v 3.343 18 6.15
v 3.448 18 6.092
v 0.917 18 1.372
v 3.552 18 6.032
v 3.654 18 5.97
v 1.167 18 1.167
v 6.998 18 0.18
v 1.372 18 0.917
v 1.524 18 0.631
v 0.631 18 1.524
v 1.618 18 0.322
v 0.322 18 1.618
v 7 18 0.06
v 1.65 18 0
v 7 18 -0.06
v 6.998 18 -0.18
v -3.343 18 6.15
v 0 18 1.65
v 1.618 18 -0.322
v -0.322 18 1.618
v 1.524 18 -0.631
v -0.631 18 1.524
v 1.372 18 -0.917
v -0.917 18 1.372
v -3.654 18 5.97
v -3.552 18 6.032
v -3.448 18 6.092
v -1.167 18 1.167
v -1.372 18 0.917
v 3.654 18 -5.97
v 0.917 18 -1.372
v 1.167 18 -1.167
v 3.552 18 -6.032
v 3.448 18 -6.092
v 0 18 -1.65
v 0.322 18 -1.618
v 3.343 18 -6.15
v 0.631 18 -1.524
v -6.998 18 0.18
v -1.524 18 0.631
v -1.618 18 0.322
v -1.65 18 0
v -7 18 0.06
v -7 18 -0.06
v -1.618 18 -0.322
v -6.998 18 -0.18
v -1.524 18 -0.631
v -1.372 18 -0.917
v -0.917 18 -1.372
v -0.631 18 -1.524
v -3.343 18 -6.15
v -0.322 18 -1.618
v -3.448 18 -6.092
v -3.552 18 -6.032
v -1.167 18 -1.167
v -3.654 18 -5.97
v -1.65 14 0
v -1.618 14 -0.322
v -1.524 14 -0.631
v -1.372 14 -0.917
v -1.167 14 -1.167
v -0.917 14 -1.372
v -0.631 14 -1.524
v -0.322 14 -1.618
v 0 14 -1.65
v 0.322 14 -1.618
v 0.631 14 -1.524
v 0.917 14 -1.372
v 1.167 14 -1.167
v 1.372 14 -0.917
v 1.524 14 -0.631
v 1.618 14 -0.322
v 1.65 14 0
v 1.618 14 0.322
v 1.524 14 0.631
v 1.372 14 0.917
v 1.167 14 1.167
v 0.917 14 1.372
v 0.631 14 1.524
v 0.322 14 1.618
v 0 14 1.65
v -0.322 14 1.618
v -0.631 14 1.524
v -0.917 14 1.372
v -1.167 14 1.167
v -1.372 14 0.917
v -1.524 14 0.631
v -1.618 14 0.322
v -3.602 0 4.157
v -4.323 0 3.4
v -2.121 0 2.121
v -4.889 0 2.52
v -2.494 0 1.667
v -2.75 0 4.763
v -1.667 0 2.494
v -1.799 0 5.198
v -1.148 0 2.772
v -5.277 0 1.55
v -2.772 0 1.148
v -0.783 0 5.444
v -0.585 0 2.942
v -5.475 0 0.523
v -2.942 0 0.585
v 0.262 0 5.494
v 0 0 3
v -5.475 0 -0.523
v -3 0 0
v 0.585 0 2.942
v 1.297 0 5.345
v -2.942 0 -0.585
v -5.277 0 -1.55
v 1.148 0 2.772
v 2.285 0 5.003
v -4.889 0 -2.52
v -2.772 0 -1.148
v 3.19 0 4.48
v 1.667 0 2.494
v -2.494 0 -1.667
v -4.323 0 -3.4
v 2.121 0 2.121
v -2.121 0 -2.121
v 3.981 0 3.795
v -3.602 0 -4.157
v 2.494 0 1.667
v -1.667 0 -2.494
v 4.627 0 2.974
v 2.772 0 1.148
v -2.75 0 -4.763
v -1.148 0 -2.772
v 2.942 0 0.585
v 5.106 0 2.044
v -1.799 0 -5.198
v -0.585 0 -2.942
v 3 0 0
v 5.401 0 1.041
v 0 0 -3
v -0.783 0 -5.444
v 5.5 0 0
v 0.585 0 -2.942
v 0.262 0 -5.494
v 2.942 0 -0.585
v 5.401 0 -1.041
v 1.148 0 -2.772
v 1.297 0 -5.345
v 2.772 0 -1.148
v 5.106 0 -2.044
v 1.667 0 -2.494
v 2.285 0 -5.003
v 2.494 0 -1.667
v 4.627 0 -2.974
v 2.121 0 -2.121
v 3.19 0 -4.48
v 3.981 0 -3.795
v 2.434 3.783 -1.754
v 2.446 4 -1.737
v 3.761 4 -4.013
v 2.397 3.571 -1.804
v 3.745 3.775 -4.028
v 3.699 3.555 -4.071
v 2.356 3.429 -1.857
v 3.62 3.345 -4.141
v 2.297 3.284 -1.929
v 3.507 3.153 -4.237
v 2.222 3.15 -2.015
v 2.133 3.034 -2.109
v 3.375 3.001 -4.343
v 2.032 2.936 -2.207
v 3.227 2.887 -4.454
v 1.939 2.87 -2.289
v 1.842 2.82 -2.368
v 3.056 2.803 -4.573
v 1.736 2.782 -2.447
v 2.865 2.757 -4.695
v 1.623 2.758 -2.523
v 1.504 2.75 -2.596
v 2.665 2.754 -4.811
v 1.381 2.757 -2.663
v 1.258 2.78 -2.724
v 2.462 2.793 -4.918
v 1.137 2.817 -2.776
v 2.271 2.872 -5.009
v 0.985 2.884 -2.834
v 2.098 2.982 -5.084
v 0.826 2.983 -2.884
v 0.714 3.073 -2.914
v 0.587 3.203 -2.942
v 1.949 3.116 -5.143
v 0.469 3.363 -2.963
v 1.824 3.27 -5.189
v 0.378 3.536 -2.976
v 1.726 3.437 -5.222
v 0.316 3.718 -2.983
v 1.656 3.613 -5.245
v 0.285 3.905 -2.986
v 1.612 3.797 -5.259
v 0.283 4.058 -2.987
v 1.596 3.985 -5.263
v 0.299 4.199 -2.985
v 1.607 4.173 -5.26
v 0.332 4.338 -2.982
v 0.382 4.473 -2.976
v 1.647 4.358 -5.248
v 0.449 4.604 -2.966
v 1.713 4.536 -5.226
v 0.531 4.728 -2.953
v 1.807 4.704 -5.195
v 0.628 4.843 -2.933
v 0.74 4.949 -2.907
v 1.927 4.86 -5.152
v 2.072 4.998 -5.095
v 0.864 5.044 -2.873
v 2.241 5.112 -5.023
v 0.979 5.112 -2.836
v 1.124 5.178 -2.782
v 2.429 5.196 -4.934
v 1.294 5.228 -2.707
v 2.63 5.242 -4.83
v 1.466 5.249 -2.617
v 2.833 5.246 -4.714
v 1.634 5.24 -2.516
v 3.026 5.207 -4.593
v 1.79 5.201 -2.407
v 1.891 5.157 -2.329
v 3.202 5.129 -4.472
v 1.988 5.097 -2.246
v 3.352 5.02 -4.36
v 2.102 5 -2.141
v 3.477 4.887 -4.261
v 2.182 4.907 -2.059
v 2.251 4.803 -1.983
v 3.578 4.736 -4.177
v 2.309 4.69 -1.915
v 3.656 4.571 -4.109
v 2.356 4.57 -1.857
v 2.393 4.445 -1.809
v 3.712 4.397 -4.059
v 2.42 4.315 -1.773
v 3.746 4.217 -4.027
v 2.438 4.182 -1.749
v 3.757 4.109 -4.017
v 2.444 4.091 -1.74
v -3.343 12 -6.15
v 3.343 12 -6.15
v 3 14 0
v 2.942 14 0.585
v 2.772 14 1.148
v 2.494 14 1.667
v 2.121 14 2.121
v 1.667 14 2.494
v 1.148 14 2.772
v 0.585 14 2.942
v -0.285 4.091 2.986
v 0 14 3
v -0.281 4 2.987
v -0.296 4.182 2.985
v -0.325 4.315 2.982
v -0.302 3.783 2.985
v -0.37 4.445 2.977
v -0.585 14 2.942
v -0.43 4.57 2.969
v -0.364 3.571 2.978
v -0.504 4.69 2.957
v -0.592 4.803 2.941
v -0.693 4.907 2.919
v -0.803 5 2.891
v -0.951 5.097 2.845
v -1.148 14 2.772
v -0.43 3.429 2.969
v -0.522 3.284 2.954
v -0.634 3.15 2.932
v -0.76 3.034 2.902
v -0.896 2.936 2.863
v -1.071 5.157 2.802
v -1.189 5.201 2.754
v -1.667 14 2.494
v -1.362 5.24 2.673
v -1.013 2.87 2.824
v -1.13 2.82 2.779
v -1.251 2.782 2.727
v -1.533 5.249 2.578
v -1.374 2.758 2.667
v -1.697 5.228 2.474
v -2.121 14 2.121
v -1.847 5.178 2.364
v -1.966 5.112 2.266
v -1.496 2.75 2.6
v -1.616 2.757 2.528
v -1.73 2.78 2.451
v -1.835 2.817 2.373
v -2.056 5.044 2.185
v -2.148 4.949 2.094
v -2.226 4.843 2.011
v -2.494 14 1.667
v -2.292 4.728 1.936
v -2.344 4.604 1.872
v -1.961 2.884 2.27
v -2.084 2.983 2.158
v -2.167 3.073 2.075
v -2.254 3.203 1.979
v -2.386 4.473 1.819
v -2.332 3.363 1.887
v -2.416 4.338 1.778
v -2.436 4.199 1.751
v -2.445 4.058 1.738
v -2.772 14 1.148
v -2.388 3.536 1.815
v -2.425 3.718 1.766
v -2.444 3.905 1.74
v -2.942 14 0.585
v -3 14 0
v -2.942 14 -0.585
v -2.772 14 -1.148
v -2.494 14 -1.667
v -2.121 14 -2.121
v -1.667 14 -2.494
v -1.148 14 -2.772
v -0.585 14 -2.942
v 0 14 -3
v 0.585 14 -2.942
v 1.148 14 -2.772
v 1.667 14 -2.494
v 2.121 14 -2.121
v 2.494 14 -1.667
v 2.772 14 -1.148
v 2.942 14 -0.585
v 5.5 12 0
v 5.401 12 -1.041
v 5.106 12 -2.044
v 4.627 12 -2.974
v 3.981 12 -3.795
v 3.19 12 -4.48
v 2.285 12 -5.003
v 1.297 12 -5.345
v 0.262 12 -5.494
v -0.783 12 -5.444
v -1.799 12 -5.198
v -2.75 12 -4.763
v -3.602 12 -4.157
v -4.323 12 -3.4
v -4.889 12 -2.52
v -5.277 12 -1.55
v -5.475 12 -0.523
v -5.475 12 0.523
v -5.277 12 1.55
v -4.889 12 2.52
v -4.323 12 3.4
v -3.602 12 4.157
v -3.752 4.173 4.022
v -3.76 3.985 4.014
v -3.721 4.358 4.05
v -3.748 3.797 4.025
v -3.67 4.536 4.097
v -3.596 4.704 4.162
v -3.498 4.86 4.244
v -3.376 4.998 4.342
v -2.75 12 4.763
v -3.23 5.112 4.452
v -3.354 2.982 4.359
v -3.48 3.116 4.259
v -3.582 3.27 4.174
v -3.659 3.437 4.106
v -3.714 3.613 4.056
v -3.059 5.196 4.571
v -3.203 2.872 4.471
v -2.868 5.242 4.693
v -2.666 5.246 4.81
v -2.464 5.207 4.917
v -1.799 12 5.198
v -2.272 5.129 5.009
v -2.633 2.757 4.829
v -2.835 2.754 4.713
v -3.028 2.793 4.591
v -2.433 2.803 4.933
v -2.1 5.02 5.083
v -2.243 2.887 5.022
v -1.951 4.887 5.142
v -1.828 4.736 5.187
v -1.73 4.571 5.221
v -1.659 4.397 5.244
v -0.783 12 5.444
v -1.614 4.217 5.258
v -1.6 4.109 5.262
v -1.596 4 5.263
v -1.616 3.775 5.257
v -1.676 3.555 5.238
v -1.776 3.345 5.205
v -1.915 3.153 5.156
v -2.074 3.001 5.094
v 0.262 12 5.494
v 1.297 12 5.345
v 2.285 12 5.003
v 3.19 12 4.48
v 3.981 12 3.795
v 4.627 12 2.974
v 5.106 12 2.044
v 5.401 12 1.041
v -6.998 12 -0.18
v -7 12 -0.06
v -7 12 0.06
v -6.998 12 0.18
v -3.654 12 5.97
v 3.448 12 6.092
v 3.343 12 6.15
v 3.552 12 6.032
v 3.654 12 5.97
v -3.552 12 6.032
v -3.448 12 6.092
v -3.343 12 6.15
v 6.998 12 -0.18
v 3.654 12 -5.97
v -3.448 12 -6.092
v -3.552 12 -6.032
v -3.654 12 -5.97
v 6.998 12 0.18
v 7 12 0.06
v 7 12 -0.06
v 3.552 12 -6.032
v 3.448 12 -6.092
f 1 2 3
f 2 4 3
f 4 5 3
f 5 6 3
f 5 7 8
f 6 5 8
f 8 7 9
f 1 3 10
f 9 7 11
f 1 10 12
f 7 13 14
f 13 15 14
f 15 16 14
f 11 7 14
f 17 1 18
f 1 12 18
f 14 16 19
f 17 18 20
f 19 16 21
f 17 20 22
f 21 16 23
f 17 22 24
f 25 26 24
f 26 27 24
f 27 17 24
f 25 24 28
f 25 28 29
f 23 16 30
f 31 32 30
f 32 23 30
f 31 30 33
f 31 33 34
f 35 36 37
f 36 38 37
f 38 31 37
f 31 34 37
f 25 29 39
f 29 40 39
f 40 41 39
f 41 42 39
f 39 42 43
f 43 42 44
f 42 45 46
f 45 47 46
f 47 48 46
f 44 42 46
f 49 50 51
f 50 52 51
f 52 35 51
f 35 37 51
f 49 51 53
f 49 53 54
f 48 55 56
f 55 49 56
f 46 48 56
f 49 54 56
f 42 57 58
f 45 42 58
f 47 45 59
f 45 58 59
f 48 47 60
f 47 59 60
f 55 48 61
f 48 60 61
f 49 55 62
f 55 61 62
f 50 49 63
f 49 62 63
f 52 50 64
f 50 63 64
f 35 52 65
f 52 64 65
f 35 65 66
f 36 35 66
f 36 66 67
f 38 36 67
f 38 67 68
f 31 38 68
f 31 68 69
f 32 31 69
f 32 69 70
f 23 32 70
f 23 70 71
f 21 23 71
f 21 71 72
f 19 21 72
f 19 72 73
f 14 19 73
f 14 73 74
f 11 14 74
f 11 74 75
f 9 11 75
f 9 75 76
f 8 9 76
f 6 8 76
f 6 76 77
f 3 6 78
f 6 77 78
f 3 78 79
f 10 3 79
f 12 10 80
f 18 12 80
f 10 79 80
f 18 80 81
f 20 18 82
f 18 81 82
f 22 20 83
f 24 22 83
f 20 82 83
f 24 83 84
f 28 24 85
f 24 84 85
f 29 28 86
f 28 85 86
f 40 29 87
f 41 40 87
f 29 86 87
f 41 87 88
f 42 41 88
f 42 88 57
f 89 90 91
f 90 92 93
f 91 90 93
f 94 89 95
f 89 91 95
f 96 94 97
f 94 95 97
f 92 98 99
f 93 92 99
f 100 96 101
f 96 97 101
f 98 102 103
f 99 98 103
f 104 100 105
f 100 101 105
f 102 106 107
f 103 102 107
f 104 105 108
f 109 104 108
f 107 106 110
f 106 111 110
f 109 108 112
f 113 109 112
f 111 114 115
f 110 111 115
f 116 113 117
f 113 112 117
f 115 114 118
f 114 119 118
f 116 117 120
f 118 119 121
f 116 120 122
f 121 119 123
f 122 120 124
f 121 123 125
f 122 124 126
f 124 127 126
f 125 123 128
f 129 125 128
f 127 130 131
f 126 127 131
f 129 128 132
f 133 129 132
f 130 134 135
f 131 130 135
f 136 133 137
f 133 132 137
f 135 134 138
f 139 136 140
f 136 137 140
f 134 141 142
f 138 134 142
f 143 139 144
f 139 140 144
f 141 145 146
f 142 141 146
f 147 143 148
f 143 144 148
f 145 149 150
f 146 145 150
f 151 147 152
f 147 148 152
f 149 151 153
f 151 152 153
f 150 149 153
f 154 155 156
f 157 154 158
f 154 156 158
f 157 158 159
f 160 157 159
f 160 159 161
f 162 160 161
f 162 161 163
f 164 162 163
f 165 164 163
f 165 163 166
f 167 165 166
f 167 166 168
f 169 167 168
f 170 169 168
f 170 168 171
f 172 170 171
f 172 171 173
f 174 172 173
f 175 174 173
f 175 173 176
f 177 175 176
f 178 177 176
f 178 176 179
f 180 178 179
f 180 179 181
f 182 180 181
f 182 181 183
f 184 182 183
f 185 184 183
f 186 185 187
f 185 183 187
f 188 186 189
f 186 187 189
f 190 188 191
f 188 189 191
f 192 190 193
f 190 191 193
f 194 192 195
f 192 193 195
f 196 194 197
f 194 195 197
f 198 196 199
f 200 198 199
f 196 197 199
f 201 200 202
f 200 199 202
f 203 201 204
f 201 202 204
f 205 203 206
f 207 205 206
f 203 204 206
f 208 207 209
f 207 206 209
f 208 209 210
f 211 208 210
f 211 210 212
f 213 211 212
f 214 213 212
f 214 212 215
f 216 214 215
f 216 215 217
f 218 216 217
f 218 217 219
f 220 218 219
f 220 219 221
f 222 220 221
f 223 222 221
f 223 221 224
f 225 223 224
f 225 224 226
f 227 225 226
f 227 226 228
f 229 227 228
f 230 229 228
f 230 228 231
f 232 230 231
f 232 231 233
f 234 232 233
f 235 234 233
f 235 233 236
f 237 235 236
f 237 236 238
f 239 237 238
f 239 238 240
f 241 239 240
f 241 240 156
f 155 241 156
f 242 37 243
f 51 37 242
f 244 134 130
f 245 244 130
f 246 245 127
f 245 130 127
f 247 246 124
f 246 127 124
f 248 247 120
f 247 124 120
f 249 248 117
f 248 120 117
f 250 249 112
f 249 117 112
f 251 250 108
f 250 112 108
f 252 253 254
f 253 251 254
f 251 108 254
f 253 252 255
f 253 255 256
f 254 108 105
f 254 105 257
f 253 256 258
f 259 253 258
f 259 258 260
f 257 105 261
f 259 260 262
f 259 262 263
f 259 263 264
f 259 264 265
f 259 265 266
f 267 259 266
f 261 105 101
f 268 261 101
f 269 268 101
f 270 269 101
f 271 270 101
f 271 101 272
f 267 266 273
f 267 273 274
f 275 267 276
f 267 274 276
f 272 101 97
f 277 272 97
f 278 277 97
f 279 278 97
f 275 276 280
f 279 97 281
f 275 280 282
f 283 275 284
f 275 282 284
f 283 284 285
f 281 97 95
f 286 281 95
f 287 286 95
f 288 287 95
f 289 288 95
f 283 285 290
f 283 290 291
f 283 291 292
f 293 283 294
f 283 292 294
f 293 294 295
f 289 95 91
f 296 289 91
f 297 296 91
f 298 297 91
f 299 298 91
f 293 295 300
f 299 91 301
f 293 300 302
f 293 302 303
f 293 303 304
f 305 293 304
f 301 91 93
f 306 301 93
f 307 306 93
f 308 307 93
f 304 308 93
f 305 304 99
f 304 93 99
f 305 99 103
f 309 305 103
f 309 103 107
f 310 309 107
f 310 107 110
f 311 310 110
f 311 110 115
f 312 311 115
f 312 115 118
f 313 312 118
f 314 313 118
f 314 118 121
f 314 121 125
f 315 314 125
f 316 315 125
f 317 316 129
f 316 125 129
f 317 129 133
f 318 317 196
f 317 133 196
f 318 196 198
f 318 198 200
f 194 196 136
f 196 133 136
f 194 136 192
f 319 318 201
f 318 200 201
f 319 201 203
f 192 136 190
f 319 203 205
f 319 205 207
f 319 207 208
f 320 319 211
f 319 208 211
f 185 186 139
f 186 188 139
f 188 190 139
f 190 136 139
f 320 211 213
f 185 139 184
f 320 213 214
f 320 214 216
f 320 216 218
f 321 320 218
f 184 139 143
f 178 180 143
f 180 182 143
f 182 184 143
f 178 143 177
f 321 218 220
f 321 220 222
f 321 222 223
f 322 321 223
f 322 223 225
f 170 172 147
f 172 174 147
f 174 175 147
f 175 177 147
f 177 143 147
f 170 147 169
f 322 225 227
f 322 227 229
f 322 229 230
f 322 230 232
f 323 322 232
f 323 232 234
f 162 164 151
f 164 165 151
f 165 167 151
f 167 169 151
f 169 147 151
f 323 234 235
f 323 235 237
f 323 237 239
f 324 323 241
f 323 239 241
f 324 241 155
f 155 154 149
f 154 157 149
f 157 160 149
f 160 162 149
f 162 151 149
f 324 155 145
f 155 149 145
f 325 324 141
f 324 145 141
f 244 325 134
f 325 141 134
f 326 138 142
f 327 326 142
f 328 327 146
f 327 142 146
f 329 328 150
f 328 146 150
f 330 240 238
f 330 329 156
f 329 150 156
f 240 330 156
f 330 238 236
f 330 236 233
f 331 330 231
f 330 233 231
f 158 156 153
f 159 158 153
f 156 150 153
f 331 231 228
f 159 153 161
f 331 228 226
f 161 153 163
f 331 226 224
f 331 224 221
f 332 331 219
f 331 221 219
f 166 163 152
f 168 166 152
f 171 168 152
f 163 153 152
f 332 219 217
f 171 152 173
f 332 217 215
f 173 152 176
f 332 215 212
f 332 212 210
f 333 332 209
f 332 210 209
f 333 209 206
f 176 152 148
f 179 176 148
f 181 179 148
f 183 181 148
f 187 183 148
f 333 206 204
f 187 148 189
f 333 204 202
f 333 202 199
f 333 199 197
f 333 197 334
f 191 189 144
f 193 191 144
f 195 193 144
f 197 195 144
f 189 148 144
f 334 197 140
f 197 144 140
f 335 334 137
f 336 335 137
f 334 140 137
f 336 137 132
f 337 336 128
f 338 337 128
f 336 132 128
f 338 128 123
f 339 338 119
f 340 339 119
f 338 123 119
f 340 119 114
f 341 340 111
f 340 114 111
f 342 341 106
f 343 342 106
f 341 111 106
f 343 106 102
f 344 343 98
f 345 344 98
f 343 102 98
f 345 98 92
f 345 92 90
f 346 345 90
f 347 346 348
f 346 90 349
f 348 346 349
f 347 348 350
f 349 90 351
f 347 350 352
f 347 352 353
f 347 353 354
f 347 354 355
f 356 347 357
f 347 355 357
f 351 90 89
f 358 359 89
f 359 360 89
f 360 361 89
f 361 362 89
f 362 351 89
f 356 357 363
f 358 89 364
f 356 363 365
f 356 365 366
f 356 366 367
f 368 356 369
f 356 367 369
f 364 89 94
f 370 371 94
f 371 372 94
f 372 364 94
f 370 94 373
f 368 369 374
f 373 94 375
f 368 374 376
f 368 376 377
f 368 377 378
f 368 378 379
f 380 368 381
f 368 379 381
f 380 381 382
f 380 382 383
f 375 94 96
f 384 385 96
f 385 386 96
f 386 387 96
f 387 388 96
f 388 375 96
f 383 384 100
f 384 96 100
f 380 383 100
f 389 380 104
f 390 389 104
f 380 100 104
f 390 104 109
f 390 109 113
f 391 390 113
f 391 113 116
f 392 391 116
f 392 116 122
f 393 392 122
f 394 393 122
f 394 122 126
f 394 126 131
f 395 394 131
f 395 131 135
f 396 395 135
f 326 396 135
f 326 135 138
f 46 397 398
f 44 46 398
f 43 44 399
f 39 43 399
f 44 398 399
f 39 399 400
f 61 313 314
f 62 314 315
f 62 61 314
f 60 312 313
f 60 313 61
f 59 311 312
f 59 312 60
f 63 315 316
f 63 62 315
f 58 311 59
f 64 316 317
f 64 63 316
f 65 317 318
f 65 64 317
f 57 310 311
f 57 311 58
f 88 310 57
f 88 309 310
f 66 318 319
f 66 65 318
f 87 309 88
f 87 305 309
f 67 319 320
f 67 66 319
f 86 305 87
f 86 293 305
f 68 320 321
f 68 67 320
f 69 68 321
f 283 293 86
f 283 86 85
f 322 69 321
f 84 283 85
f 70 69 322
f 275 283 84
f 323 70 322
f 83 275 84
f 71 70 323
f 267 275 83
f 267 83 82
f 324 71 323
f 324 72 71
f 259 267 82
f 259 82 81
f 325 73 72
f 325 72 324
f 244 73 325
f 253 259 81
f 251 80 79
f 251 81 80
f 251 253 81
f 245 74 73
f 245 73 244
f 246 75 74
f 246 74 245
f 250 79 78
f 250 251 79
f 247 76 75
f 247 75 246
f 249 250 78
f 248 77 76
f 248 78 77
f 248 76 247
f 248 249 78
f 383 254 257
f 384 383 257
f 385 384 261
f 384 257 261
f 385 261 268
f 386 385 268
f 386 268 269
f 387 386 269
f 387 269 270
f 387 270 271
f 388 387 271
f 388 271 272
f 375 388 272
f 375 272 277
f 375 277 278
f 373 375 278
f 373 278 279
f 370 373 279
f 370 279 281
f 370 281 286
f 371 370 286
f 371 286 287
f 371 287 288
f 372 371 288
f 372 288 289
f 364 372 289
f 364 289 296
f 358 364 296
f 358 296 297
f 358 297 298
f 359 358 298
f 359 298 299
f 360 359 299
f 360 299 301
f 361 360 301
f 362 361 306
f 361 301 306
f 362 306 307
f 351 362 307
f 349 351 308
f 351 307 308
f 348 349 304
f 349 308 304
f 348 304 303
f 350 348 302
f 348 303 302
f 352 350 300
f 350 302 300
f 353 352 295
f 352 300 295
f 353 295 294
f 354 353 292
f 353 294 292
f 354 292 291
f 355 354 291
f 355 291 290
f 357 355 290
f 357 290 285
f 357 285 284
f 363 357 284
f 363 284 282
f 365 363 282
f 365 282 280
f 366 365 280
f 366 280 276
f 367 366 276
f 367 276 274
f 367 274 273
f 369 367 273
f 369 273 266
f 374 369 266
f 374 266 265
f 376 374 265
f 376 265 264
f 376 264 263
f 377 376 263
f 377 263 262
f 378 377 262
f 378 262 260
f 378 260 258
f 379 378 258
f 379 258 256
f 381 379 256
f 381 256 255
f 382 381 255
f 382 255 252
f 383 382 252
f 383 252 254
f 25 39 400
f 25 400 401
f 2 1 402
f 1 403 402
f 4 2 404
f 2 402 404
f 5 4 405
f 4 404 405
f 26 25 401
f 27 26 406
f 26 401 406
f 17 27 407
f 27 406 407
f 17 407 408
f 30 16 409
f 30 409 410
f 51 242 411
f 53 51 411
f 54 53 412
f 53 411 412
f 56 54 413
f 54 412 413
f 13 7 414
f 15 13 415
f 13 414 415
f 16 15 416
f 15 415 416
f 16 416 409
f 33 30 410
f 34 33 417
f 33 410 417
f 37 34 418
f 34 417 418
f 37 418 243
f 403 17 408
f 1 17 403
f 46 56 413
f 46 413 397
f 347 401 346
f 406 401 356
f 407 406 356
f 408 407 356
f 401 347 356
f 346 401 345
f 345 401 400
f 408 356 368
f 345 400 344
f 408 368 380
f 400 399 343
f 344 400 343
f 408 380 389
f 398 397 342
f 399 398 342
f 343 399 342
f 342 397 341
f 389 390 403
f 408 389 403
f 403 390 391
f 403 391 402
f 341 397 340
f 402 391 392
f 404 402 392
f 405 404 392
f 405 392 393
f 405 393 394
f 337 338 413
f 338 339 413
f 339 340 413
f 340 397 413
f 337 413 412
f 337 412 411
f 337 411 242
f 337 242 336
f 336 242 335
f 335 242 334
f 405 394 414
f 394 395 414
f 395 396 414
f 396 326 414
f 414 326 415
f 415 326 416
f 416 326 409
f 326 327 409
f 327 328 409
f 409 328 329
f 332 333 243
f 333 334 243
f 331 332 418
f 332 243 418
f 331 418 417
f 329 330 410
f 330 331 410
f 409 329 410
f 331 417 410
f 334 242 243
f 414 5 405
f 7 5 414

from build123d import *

# Parameters (mm, degrees)
SKETCH_2_OUTSIDE_W  = 21.352
SKETCH_2_OUTSIDE_H  = 21.352
CUT_EXTRUDE_1_DEPTH = 19
HOLE_WIZARD_M4_1_D  = 3.3
SKETCH_5_R          = 3
CUT_EXTRUDE_2_DEPTH = 14
HOLE_WIZARD_M3_1_D  = 2.5


with BuildPart() as part:
    # 草图1 → 旋转1 (revolve)
    with BuildSketch(Plane.XY):
        Polygon((0, 0), (0, 18), (7, 18), (7, 12), (5.5, 12), (5.5, 0), align=None)
    revolve(axis=Axis((0, 0, 0), (0, 1, 0)))

    # 草图2 outside → 切除-拉伸1 (cut, through all)
    with BuildSketch(Plane(origin=(0, 18, 0), x_dir=(1, 0, 0), z_dir=(0, 1, 0))):
        Rectangle(SKETCH_2_OUTSIDE_W, SKETCH_2_OUTSIDE_H)
        Polygon((7.101408311, 0), (3.550704156, 6.15), (-3.550704156, 6.15), (-7.101408311, 0), (-3.550704156, -6.15), (3.550704156, -6.15), align=None, mode=Mode.SUBTRACT)
    extrude(amount=-CUT_EXTRUDE_1_DEPTH, mode=Mode.SUBTRACT)

    # M4 螺纹孔1 (through all)
    with Locations(Plane(origin=(0, 18, 0), x_dir=(1, 0, 0), z_dir=(0, 1, 0))):
        with Locations((0, 0)):
            Hole(HOLE_WIZARD_M4_1_D / 2)

    # 草图5 → 切除-拉伸2 (cut)
    with BuildSketch(Plane.XZ):
        Circle(SKETCH_5_R)
    extrude(amount=-CUT_EXTRUDE_2_DEPTH, mode=Mode.SUBTRACT)

    # M3 螺纹孔1 (through all)
    with Locations(Plane(origin=(-2.75, 0, 4.763139721), x_dir=(-0.866025404, 0, -0.5), z_dir=(-0.5, 0, 0.866025404))):
        with Locations((0, -4)):
            Hole(HOLE_WIZARD_M3_1_D / 2)


solid = part.part
